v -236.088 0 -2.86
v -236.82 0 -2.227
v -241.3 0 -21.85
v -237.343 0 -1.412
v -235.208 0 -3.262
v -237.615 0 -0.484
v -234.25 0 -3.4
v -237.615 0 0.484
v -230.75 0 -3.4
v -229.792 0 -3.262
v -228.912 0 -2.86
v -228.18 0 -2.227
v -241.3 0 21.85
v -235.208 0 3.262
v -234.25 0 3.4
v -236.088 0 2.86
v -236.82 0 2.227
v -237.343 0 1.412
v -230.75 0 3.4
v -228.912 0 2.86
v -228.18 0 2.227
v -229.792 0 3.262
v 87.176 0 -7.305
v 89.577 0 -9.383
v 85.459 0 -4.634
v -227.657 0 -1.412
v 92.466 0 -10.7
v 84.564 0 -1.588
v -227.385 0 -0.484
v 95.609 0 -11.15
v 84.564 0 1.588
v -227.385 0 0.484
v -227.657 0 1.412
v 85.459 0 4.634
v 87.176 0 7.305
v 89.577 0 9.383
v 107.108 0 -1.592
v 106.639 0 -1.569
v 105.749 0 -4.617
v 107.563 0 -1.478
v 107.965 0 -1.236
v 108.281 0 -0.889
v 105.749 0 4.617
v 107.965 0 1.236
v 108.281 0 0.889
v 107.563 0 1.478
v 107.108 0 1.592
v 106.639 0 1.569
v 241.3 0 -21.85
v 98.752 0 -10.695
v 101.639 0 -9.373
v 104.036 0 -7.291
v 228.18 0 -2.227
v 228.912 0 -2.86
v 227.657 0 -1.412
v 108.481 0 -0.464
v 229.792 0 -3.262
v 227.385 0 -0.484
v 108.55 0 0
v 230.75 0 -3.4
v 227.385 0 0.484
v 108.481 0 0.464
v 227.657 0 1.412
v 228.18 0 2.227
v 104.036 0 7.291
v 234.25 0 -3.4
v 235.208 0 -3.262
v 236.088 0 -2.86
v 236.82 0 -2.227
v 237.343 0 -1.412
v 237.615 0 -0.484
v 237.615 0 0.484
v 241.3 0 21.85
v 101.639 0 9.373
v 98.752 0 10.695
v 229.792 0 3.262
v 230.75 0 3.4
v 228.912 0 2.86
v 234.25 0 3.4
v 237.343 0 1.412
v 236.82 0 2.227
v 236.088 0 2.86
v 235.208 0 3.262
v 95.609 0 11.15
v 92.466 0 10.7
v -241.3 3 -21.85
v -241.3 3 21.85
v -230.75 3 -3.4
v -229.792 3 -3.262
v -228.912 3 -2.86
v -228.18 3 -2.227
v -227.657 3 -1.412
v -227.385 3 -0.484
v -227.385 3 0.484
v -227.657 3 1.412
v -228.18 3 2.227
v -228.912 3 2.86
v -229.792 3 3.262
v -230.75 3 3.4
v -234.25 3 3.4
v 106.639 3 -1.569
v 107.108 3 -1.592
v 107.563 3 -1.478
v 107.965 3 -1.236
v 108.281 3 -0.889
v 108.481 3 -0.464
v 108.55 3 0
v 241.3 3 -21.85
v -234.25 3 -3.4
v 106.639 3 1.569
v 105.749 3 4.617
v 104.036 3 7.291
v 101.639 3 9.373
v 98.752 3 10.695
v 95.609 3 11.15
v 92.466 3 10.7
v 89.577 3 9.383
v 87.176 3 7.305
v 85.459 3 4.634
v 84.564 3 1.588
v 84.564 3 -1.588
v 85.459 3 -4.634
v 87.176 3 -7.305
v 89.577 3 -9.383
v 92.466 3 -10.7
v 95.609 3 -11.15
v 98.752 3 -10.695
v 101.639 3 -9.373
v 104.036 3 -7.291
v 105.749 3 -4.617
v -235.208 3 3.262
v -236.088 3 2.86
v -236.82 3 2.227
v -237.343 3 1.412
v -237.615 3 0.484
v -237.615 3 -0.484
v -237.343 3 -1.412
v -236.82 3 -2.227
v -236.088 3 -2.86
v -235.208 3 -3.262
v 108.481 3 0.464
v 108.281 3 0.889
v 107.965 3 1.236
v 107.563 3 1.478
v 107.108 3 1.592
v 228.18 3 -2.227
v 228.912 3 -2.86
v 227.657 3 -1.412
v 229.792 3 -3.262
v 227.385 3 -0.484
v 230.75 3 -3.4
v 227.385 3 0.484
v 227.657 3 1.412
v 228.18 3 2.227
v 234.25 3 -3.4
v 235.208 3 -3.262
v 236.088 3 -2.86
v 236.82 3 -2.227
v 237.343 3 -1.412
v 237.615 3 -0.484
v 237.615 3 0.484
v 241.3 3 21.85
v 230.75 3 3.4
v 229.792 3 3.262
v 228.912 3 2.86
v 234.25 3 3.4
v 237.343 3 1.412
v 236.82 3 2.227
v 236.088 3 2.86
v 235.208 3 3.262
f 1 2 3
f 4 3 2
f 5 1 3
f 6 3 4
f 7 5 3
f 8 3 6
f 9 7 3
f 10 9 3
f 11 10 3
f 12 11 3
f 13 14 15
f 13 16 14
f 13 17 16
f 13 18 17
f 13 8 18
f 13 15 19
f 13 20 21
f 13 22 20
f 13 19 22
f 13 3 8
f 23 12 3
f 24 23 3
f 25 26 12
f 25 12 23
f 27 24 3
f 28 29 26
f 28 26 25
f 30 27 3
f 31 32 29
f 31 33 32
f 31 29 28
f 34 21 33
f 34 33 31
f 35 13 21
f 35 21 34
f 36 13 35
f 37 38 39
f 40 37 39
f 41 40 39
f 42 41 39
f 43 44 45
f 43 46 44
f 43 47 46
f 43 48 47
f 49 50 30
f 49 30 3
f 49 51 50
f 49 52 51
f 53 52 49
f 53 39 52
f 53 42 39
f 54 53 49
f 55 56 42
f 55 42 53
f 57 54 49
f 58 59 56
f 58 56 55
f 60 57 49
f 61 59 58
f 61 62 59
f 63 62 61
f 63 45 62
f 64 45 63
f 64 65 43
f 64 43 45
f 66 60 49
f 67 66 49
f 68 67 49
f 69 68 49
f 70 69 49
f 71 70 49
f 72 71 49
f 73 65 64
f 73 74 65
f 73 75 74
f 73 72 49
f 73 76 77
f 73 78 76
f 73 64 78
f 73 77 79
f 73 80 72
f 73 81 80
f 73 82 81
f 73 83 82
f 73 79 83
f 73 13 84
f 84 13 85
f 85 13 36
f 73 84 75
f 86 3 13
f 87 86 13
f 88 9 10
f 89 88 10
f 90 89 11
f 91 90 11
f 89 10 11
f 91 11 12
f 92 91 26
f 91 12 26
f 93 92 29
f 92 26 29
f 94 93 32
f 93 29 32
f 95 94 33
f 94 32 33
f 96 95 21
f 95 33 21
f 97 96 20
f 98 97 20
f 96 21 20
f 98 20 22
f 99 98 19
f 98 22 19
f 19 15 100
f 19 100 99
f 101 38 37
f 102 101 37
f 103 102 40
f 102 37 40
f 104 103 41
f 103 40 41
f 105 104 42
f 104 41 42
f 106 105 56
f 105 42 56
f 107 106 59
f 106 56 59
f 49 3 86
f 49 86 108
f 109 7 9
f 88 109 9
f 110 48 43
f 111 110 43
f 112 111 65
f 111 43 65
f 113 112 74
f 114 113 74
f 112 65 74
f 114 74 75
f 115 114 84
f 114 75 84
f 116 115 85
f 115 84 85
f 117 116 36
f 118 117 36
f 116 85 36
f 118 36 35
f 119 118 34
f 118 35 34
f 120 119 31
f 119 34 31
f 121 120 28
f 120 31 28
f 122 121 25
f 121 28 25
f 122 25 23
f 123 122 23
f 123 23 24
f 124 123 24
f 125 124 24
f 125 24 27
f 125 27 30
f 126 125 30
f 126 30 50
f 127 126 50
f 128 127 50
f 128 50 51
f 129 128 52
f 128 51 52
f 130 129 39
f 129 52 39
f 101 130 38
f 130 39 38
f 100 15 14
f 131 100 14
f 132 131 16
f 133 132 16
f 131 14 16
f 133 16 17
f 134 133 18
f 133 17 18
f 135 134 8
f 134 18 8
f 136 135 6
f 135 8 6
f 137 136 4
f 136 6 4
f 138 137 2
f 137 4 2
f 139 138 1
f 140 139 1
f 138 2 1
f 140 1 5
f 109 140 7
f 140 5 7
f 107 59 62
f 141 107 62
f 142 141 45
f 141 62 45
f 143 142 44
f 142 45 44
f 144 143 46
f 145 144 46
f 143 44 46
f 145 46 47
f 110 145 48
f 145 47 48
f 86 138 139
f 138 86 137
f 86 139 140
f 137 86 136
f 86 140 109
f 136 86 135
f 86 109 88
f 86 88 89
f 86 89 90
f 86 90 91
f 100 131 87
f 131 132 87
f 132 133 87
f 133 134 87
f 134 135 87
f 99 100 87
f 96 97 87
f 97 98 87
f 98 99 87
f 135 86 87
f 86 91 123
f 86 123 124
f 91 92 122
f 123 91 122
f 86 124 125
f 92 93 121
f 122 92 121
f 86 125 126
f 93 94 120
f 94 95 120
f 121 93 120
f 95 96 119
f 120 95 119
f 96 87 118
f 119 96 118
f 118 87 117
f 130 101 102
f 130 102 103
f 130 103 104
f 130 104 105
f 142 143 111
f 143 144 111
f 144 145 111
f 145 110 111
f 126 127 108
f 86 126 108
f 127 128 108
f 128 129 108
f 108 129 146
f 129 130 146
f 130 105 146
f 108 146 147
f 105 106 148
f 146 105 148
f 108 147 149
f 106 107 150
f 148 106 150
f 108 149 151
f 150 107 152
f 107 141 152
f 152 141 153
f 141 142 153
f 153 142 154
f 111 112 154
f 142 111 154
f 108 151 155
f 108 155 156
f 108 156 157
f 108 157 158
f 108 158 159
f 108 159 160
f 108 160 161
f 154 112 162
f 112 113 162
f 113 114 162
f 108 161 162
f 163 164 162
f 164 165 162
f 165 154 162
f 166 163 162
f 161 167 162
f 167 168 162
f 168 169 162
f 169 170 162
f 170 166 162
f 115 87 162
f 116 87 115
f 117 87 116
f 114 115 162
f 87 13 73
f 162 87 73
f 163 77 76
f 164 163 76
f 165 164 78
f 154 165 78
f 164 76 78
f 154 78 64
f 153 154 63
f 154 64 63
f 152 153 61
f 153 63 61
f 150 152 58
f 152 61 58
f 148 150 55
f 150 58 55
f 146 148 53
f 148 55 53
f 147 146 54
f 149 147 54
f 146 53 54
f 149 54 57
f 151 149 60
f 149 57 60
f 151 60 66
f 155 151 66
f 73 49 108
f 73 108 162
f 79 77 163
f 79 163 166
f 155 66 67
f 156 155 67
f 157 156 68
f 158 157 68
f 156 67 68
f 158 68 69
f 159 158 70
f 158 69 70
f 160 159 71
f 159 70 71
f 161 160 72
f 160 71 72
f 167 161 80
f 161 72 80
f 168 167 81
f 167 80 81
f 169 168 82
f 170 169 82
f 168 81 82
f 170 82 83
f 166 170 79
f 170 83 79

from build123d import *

# Parameters (mm, degrees)
F0_W     = 482.6
F0_H     = 43.7
F1_DEPTH = 3
F2_W     = 3.5
F2_H     = 6.8
F3_W     = 3.5
F3_H     = 6.8
F4_DEPTH = 3
F6_DEPTH = 3


with BuildPart() as f1:
    # F0 (on Front) → F1 (new body)
    with BuildSketch(Plane.XZ):
        Rectangle(F0_W, F0_H)
    extrude(amount=-F1_DEPTH)

    # F2 (on face) + F3 (on face) → F4 (cut)
    with BuildSketch(Plane.XZ):
        with Locations((-232.5, 0)):
            Rectangle(F2_W, F2_H)
        with BuildLine():
            Line((-230.75, 3.4), (-230.75, -3.4))
            ThreePointArc((-230.75, -3.4), (-227.35, 0), (-230.75, 3.4))
        make_face()
        with BuildLine():
            ThreePointArc((-234.25, 3.4), (-237.65, 0), (-234.25, -3.4))
            Line((-234.25, -3.4), (-234.25, 3.4))
        make_face()
    with BuildSketch(Plane.XZ):
        with Locations((232.5, 0)):
            Rectangle(F3_W, F3_H)
        with BuildLine():
            Line((234.25, 3.4), (234.25, -3.4))
            ThreePointArc((234.25, -3.4), (237.65, 0), (234.25, 3.4))
        make_face()
        with BuildLine():
            ThreePointArc((230.75, 3.4), (227.35, 0), (230.75, -3.4))
            Line((230.75, -3.4), (230.75, 3.4))
        make_face()
    extrude(amount=-F4_DEPTH, mode=Mode.SUBTRACT)

    # F5 (on face) → F6 (cut)
    with BuildSketch(Plane.XZ):
        with BuildLine():
            ThreePointArc((106.6389867841, -1.5694810542), (107.9654749762, -1.2364507967), (108.55, 0))
            ThreePointArc((108.55, 0), (107.9654749762, 1.2364507967), (106.6389867841, 1.5694810542))
            ThreePointArc((106.6389867841, 1.5694810542), (106.7222120696, 0.7867011367), (106.75, 0))
            ThreePointArc((106.75, 0), (106.7222120696, -0.7867011367), (106.6389867841, -1.5694810542))
        make_face()
        with BuildLine():
            ThreePointArc((106.75, 0), (106.7222120696, 0.7867011367), (106.6389867841, 1.5694810542))
            ThreePointArc((106.6389867841, 1.5694810542), (105.35, 0), (106.6389867841, -1.5694810542))
            ThreePointArc((106.6389867841, -1.5694810542), (106.7222120696, -0.7867011367), (106.75, 0))
        make_face()
        with BuildLine():
            ThreePointArc((106.6389867841, -1.5694810542), (105.35, 0), (106.6389867841, 1.5694810542))
            ThreePointArc((106.6389867841, 1.5694810542), (84.45, 0), (106.6389867841, -1.5694810542))
        make_face()
    extrude(amount=-F6_DEPTH, mode=Mode.SUBTRACT)


solid = f1.part
